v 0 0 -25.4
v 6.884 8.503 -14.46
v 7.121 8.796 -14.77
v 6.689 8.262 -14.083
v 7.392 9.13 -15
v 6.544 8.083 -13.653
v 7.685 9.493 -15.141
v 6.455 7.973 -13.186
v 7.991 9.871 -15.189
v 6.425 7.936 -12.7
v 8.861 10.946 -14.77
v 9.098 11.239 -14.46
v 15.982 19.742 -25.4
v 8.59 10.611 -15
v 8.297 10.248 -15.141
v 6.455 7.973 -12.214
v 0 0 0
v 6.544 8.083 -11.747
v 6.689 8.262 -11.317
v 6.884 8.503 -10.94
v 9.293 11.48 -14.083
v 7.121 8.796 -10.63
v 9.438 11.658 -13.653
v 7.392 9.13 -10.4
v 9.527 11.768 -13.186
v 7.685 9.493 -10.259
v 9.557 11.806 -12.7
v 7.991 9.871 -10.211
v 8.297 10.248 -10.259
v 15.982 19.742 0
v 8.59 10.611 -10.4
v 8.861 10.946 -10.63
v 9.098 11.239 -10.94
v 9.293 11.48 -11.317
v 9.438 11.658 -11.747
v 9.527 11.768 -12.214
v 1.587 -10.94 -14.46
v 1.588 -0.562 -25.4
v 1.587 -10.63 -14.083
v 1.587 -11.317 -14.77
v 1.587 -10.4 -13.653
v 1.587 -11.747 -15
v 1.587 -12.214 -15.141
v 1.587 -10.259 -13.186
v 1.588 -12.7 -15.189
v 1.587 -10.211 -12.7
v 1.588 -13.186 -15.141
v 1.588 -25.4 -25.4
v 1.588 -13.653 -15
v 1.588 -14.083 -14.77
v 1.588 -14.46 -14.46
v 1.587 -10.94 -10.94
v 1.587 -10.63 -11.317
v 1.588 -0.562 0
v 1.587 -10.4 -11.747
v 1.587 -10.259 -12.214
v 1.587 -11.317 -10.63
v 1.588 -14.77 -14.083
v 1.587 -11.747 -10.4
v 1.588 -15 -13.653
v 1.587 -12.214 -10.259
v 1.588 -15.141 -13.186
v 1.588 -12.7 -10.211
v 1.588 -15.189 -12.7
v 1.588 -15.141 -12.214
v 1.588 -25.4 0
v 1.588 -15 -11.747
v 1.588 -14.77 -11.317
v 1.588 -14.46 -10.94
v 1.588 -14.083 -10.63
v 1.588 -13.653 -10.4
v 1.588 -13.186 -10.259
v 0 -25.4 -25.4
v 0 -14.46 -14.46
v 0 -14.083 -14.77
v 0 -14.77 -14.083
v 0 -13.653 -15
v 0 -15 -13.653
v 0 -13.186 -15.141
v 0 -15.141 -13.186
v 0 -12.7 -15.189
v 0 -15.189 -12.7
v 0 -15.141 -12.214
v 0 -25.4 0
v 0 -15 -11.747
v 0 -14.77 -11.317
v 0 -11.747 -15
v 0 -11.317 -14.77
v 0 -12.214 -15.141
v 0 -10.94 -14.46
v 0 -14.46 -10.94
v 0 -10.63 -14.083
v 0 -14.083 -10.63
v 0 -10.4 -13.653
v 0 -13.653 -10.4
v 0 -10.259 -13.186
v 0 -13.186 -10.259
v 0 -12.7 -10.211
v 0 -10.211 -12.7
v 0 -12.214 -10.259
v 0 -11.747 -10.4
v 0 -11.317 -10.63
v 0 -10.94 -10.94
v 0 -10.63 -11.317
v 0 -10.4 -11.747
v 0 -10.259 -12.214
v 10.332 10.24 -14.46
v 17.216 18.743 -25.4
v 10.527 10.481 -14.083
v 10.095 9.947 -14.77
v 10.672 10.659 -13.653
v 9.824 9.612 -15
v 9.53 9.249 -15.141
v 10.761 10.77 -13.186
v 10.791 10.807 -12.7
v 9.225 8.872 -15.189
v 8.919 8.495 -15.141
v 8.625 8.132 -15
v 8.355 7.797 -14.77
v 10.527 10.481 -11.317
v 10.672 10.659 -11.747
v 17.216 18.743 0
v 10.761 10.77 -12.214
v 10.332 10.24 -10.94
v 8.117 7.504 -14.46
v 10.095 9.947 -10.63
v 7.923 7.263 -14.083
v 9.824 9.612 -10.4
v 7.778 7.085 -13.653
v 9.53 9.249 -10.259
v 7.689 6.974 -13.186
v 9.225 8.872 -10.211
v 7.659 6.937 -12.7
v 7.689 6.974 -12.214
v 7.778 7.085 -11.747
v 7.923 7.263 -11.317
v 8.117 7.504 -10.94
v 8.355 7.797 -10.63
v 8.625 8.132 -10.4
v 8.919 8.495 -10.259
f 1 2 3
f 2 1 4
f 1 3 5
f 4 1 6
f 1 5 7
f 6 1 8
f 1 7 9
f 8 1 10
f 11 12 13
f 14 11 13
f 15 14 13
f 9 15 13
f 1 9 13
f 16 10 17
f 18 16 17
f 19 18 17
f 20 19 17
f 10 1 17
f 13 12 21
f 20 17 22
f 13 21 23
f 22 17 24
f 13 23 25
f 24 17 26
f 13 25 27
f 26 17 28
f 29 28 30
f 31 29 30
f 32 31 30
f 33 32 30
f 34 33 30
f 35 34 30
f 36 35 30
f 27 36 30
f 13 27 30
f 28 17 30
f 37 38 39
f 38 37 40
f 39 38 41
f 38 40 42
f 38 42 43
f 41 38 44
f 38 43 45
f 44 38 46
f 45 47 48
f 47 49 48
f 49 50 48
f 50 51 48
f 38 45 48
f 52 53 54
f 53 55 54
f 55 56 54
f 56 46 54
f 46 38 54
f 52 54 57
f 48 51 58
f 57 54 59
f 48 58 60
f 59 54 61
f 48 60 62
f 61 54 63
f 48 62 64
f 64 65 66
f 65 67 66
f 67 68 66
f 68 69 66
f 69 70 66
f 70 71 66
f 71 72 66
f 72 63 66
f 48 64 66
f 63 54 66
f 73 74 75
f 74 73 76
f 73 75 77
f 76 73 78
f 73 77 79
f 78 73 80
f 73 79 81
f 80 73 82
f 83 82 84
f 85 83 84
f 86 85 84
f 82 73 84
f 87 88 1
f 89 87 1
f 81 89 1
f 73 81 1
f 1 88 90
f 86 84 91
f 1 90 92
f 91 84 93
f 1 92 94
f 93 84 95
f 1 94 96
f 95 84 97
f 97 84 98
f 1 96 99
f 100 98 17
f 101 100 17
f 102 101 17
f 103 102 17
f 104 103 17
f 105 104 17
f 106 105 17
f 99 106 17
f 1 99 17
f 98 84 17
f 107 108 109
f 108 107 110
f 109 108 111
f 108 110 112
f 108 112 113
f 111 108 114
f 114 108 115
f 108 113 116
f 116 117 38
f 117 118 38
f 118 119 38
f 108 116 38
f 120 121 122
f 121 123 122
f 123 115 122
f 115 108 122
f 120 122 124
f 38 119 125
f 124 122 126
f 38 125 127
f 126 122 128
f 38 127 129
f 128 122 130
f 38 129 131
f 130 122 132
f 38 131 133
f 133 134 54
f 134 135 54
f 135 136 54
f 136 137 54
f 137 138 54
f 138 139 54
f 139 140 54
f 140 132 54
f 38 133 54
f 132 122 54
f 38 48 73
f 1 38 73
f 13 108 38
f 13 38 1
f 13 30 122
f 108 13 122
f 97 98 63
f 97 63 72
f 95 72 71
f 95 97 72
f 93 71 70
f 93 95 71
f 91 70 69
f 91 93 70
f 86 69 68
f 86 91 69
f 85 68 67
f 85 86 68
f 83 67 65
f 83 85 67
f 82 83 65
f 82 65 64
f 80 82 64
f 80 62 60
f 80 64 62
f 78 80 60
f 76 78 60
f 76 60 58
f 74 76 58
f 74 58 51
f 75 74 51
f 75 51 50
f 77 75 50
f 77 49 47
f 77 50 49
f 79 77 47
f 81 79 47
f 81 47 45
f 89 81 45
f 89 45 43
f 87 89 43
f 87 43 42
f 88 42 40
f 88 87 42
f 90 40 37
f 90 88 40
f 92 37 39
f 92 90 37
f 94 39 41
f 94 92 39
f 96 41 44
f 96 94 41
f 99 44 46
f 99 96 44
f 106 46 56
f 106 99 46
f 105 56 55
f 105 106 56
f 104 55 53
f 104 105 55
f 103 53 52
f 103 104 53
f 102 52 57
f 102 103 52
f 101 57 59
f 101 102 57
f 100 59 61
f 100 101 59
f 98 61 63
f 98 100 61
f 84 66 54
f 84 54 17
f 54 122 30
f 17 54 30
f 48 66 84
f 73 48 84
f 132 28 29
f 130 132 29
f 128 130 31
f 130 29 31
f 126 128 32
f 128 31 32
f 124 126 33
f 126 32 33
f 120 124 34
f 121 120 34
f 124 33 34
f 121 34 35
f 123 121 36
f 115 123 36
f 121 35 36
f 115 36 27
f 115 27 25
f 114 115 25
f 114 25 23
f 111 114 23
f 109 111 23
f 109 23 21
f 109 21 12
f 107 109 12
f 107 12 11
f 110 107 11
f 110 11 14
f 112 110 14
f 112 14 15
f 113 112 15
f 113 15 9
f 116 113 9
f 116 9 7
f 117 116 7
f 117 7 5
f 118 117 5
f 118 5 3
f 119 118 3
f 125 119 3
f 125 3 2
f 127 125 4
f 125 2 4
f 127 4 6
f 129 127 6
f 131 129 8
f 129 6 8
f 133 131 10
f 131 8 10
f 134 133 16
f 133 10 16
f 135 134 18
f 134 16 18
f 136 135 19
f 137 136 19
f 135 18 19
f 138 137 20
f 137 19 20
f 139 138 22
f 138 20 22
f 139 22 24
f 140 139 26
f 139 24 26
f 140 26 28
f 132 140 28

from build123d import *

# Parameters (mm, degrees)
EXTRUDE_THIN1_DEPTH            = 25.4
F_9_0_196_DIAMETER_HOLE1_D     = 4.9784
F_9_0_196_DIAMETER_HOLE1_DEPTH = 1.5885


with BuildPart() as part:
    # Sketch1 → Extrude-Thin1 (new body)
    with BuildSketch(Plane.XY):
        Polygon((0, -25.4), (0, 0), (15.981992956, 19.741729943), (17.215851078, 18.742855383), (1.5875, -0.562039024), (1.5875, -25.4), align=None)
    extrude(amount=-EXTRUDE_THIN1_DEPTH)

    # #9 (0.196) Diameter Hole1
    with Locations(Plane(origin=(1.233858121, -0.99887456, 0), x_dir=(0, 0, -1), z_dir=(0.777233462, -0.629212321, 0))):
        with Locations((12.7, 12.7)):
            f_9_0_196_diameter_hole1 = Hole(F_9_0_196_DIAMETER_HOLE1_D / 2, depth=F_9_0_196_DIAMETER_HOLE1_DEPTH)

    # Mirror1: #9 (0.196) Diameter Hole1 across plane
    add(f_9_0_196_diameter_hole1.mirror(Plane(origin=(0, 0, 0), x_dir=(0, 0, 1), z_dir=(-0.33374132, -0.942664697, 0))), mode=Mode.SUBTRACT)


solid = part.part
